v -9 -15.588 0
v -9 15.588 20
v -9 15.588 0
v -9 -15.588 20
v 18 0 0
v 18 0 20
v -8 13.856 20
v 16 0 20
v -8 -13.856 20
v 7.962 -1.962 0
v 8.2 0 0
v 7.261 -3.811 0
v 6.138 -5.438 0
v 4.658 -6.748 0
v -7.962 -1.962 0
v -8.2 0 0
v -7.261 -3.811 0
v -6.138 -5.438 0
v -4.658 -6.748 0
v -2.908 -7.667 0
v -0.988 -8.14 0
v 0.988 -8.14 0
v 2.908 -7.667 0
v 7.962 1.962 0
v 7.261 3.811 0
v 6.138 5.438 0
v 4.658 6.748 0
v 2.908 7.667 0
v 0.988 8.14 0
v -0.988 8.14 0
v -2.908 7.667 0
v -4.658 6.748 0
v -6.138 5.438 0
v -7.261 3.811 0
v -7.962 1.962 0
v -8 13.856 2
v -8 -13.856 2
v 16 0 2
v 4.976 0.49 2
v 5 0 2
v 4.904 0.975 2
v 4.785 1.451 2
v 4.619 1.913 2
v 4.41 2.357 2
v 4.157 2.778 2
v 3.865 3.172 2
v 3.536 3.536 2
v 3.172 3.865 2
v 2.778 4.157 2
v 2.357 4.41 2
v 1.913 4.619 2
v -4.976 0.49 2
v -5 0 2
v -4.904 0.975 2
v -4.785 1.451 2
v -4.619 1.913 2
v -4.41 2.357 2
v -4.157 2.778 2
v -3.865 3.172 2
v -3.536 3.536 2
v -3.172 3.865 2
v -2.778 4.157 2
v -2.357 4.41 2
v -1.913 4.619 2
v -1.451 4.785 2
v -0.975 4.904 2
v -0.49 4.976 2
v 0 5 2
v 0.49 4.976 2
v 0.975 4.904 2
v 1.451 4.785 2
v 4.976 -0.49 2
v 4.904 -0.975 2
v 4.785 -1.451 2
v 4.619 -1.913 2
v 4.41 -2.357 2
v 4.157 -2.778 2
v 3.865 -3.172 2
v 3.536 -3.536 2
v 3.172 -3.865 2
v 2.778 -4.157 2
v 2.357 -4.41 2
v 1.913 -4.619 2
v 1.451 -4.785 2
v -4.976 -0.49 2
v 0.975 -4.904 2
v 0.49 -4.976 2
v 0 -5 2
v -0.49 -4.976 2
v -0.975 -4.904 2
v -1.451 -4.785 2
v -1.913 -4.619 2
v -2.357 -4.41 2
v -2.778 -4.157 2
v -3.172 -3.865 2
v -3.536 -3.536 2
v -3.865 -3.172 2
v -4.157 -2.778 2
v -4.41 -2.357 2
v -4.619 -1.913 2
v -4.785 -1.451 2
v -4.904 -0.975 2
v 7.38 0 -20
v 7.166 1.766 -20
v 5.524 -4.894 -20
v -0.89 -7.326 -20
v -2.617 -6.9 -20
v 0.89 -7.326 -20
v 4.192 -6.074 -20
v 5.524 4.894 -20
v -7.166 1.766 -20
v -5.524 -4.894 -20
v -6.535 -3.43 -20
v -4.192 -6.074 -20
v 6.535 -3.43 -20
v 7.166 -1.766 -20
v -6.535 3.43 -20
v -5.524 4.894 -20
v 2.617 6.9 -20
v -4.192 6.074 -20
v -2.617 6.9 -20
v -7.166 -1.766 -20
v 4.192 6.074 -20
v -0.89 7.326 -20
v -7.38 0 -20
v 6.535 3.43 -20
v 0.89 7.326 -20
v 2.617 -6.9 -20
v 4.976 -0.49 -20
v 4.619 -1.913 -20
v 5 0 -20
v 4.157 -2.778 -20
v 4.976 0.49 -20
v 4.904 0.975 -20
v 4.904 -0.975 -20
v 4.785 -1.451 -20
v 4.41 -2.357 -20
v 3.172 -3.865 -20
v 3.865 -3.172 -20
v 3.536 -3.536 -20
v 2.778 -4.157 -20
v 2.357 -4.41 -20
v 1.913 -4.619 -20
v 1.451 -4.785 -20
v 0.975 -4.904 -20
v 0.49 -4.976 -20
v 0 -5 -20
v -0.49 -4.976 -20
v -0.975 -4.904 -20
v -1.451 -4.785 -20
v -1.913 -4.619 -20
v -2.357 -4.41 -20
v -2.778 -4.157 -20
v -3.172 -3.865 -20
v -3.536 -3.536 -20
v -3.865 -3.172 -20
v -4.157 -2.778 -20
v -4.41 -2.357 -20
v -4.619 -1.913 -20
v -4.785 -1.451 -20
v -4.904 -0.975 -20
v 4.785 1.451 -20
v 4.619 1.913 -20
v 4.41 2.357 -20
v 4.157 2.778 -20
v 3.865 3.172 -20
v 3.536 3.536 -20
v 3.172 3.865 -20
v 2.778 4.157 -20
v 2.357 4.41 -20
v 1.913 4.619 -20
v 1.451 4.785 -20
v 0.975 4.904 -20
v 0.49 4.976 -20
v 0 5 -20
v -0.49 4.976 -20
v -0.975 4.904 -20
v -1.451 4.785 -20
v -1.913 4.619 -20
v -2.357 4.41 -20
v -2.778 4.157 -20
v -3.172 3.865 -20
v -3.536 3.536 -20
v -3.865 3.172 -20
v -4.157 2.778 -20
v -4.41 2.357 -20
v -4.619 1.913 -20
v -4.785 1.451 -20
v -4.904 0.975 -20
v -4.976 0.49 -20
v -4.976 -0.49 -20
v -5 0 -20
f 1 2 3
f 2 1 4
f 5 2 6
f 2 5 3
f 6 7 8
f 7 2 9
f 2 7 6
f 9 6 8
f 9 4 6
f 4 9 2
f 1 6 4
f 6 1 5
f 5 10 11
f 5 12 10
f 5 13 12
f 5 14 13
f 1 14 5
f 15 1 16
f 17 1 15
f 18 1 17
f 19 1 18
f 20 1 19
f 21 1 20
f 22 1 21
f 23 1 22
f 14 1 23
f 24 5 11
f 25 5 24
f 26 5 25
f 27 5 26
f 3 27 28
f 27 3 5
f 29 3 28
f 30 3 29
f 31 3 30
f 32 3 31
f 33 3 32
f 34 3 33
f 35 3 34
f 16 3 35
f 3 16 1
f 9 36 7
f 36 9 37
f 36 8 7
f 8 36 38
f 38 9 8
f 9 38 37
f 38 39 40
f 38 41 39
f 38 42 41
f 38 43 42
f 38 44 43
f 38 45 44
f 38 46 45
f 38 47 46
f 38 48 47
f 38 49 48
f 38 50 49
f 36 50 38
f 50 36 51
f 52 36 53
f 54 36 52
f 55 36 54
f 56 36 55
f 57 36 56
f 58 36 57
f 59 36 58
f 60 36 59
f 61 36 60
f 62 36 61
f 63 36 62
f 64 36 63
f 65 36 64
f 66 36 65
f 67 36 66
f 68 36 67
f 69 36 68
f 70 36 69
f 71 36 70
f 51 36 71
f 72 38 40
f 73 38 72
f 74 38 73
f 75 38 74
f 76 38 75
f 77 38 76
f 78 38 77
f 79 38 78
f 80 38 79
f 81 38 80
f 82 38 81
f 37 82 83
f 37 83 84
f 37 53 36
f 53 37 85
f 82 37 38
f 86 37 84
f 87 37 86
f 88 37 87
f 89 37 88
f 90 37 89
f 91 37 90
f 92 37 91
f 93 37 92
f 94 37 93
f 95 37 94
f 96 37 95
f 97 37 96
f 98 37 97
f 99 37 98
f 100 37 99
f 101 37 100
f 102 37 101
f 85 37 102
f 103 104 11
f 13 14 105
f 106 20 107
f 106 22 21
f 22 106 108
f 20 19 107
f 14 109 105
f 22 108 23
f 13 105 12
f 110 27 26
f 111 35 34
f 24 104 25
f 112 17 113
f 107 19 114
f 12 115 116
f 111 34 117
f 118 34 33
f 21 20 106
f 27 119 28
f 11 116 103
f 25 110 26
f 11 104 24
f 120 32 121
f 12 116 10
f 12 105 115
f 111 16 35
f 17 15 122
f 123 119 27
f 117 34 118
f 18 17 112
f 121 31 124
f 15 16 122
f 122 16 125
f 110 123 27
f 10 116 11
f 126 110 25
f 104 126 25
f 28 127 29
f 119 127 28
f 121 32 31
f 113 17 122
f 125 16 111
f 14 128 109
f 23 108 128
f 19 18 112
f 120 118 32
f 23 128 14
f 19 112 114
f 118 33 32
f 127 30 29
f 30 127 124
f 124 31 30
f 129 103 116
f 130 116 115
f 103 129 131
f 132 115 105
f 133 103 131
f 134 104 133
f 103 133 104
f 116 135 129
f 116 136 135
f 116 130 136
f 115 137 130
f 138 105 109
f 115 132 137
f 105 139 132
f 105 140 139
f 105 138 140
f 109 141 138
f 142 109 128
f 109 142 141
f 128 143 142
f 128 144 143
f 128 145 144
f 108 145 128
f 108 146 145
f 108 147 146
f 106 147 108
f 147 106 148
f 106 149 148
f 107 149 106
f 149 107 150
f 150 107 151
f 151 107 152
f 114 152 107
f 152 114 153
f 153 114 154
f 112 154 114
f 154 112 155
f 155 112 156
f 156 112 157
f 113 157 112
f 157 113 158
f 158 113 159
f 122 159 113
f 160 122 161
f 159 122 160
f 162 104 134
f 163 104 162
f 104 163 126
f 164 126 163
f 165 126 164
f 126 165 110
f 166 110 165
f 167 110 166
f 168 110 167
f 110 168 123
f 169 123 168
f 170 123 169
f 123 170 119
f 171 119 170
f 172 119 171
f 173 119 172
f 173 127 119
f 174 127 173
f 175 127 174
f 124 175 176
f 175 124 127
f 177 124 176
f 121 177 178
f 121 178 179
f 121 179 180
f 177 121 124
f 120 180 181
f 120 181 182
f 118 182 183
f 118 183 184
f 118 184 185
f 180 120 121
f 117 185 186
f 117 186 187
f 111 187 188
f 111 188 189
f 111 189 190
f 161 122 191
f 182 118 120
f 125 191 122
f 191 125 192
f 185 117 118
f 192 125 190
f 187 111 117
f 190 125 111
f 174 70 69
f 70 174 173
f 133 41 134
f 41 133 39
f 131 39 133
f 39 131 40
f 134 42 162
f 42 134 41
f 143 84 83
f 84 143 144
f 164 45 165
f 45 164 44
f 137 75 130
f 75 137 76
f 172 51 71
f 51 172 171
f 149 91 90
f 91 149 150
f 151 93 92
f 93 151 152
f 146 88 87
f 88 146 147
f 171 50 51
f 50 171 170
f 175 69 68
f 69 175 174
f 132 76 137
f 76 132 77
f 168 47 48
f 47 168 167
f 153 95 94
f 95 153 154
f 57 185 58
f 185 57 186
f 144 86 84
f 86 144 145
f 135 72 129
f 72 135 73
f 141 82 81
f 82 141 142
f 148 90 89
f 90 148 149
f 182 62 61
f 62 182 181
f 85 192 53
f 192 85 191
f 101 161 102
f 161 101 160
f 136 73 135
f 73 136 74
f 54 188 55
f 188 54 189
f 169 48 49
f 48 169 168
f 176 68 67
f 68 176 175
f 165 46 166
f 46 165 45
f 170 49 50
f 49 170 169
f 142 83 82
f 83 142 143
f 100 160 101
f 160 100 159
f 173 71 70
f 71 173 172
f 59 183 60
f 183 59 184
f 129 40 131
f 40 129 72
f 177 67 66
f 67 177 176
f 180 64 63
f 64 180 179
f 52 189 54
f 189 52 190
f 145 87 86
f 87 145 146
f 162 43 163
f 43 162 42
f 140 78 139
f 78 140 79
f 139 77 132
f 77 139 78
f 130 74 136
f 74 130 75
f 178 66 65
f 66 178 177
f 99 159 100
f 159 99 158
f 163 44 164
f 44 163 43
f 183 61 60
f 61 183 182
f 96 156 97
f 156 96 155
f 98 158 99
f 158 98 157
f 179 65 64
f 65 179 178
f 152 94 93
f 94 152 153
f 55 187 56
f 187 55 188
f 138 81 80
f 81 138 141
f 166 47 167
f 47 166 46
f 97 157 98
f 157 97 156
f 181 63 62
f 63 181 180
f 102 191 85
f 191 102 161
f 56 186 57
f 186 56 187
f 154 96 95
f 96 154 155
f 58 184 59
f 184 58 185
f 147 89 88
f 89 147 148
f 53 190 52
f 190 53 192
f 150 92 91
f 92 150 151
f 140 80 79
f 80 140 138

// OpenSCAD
union() // SharpSCAD generated scene: test
{
  { // module: barbconnector
    difference()
    {
      union()
      {
        translate( v= [ 0, 0, -20 ] )
          cylinder( r1= 7.38, r2= 8.2, h= 20 );
        translate( v= [ 0, 0, 10 ] )
          difference()
          {
            cylinder( r= 18, center= true, $fn= 3, h= 20 );
            translate( v= [ 0, 0, 2 ] )
              cylinder( r= 16, center= true, $fn= 3, h= 20 );
          }
      }
      translate( v= [ 0, 0, 1 ] )
        cylinder( r= 5, center= true, $fn= 64, h= 44 );
    }
  }
}
